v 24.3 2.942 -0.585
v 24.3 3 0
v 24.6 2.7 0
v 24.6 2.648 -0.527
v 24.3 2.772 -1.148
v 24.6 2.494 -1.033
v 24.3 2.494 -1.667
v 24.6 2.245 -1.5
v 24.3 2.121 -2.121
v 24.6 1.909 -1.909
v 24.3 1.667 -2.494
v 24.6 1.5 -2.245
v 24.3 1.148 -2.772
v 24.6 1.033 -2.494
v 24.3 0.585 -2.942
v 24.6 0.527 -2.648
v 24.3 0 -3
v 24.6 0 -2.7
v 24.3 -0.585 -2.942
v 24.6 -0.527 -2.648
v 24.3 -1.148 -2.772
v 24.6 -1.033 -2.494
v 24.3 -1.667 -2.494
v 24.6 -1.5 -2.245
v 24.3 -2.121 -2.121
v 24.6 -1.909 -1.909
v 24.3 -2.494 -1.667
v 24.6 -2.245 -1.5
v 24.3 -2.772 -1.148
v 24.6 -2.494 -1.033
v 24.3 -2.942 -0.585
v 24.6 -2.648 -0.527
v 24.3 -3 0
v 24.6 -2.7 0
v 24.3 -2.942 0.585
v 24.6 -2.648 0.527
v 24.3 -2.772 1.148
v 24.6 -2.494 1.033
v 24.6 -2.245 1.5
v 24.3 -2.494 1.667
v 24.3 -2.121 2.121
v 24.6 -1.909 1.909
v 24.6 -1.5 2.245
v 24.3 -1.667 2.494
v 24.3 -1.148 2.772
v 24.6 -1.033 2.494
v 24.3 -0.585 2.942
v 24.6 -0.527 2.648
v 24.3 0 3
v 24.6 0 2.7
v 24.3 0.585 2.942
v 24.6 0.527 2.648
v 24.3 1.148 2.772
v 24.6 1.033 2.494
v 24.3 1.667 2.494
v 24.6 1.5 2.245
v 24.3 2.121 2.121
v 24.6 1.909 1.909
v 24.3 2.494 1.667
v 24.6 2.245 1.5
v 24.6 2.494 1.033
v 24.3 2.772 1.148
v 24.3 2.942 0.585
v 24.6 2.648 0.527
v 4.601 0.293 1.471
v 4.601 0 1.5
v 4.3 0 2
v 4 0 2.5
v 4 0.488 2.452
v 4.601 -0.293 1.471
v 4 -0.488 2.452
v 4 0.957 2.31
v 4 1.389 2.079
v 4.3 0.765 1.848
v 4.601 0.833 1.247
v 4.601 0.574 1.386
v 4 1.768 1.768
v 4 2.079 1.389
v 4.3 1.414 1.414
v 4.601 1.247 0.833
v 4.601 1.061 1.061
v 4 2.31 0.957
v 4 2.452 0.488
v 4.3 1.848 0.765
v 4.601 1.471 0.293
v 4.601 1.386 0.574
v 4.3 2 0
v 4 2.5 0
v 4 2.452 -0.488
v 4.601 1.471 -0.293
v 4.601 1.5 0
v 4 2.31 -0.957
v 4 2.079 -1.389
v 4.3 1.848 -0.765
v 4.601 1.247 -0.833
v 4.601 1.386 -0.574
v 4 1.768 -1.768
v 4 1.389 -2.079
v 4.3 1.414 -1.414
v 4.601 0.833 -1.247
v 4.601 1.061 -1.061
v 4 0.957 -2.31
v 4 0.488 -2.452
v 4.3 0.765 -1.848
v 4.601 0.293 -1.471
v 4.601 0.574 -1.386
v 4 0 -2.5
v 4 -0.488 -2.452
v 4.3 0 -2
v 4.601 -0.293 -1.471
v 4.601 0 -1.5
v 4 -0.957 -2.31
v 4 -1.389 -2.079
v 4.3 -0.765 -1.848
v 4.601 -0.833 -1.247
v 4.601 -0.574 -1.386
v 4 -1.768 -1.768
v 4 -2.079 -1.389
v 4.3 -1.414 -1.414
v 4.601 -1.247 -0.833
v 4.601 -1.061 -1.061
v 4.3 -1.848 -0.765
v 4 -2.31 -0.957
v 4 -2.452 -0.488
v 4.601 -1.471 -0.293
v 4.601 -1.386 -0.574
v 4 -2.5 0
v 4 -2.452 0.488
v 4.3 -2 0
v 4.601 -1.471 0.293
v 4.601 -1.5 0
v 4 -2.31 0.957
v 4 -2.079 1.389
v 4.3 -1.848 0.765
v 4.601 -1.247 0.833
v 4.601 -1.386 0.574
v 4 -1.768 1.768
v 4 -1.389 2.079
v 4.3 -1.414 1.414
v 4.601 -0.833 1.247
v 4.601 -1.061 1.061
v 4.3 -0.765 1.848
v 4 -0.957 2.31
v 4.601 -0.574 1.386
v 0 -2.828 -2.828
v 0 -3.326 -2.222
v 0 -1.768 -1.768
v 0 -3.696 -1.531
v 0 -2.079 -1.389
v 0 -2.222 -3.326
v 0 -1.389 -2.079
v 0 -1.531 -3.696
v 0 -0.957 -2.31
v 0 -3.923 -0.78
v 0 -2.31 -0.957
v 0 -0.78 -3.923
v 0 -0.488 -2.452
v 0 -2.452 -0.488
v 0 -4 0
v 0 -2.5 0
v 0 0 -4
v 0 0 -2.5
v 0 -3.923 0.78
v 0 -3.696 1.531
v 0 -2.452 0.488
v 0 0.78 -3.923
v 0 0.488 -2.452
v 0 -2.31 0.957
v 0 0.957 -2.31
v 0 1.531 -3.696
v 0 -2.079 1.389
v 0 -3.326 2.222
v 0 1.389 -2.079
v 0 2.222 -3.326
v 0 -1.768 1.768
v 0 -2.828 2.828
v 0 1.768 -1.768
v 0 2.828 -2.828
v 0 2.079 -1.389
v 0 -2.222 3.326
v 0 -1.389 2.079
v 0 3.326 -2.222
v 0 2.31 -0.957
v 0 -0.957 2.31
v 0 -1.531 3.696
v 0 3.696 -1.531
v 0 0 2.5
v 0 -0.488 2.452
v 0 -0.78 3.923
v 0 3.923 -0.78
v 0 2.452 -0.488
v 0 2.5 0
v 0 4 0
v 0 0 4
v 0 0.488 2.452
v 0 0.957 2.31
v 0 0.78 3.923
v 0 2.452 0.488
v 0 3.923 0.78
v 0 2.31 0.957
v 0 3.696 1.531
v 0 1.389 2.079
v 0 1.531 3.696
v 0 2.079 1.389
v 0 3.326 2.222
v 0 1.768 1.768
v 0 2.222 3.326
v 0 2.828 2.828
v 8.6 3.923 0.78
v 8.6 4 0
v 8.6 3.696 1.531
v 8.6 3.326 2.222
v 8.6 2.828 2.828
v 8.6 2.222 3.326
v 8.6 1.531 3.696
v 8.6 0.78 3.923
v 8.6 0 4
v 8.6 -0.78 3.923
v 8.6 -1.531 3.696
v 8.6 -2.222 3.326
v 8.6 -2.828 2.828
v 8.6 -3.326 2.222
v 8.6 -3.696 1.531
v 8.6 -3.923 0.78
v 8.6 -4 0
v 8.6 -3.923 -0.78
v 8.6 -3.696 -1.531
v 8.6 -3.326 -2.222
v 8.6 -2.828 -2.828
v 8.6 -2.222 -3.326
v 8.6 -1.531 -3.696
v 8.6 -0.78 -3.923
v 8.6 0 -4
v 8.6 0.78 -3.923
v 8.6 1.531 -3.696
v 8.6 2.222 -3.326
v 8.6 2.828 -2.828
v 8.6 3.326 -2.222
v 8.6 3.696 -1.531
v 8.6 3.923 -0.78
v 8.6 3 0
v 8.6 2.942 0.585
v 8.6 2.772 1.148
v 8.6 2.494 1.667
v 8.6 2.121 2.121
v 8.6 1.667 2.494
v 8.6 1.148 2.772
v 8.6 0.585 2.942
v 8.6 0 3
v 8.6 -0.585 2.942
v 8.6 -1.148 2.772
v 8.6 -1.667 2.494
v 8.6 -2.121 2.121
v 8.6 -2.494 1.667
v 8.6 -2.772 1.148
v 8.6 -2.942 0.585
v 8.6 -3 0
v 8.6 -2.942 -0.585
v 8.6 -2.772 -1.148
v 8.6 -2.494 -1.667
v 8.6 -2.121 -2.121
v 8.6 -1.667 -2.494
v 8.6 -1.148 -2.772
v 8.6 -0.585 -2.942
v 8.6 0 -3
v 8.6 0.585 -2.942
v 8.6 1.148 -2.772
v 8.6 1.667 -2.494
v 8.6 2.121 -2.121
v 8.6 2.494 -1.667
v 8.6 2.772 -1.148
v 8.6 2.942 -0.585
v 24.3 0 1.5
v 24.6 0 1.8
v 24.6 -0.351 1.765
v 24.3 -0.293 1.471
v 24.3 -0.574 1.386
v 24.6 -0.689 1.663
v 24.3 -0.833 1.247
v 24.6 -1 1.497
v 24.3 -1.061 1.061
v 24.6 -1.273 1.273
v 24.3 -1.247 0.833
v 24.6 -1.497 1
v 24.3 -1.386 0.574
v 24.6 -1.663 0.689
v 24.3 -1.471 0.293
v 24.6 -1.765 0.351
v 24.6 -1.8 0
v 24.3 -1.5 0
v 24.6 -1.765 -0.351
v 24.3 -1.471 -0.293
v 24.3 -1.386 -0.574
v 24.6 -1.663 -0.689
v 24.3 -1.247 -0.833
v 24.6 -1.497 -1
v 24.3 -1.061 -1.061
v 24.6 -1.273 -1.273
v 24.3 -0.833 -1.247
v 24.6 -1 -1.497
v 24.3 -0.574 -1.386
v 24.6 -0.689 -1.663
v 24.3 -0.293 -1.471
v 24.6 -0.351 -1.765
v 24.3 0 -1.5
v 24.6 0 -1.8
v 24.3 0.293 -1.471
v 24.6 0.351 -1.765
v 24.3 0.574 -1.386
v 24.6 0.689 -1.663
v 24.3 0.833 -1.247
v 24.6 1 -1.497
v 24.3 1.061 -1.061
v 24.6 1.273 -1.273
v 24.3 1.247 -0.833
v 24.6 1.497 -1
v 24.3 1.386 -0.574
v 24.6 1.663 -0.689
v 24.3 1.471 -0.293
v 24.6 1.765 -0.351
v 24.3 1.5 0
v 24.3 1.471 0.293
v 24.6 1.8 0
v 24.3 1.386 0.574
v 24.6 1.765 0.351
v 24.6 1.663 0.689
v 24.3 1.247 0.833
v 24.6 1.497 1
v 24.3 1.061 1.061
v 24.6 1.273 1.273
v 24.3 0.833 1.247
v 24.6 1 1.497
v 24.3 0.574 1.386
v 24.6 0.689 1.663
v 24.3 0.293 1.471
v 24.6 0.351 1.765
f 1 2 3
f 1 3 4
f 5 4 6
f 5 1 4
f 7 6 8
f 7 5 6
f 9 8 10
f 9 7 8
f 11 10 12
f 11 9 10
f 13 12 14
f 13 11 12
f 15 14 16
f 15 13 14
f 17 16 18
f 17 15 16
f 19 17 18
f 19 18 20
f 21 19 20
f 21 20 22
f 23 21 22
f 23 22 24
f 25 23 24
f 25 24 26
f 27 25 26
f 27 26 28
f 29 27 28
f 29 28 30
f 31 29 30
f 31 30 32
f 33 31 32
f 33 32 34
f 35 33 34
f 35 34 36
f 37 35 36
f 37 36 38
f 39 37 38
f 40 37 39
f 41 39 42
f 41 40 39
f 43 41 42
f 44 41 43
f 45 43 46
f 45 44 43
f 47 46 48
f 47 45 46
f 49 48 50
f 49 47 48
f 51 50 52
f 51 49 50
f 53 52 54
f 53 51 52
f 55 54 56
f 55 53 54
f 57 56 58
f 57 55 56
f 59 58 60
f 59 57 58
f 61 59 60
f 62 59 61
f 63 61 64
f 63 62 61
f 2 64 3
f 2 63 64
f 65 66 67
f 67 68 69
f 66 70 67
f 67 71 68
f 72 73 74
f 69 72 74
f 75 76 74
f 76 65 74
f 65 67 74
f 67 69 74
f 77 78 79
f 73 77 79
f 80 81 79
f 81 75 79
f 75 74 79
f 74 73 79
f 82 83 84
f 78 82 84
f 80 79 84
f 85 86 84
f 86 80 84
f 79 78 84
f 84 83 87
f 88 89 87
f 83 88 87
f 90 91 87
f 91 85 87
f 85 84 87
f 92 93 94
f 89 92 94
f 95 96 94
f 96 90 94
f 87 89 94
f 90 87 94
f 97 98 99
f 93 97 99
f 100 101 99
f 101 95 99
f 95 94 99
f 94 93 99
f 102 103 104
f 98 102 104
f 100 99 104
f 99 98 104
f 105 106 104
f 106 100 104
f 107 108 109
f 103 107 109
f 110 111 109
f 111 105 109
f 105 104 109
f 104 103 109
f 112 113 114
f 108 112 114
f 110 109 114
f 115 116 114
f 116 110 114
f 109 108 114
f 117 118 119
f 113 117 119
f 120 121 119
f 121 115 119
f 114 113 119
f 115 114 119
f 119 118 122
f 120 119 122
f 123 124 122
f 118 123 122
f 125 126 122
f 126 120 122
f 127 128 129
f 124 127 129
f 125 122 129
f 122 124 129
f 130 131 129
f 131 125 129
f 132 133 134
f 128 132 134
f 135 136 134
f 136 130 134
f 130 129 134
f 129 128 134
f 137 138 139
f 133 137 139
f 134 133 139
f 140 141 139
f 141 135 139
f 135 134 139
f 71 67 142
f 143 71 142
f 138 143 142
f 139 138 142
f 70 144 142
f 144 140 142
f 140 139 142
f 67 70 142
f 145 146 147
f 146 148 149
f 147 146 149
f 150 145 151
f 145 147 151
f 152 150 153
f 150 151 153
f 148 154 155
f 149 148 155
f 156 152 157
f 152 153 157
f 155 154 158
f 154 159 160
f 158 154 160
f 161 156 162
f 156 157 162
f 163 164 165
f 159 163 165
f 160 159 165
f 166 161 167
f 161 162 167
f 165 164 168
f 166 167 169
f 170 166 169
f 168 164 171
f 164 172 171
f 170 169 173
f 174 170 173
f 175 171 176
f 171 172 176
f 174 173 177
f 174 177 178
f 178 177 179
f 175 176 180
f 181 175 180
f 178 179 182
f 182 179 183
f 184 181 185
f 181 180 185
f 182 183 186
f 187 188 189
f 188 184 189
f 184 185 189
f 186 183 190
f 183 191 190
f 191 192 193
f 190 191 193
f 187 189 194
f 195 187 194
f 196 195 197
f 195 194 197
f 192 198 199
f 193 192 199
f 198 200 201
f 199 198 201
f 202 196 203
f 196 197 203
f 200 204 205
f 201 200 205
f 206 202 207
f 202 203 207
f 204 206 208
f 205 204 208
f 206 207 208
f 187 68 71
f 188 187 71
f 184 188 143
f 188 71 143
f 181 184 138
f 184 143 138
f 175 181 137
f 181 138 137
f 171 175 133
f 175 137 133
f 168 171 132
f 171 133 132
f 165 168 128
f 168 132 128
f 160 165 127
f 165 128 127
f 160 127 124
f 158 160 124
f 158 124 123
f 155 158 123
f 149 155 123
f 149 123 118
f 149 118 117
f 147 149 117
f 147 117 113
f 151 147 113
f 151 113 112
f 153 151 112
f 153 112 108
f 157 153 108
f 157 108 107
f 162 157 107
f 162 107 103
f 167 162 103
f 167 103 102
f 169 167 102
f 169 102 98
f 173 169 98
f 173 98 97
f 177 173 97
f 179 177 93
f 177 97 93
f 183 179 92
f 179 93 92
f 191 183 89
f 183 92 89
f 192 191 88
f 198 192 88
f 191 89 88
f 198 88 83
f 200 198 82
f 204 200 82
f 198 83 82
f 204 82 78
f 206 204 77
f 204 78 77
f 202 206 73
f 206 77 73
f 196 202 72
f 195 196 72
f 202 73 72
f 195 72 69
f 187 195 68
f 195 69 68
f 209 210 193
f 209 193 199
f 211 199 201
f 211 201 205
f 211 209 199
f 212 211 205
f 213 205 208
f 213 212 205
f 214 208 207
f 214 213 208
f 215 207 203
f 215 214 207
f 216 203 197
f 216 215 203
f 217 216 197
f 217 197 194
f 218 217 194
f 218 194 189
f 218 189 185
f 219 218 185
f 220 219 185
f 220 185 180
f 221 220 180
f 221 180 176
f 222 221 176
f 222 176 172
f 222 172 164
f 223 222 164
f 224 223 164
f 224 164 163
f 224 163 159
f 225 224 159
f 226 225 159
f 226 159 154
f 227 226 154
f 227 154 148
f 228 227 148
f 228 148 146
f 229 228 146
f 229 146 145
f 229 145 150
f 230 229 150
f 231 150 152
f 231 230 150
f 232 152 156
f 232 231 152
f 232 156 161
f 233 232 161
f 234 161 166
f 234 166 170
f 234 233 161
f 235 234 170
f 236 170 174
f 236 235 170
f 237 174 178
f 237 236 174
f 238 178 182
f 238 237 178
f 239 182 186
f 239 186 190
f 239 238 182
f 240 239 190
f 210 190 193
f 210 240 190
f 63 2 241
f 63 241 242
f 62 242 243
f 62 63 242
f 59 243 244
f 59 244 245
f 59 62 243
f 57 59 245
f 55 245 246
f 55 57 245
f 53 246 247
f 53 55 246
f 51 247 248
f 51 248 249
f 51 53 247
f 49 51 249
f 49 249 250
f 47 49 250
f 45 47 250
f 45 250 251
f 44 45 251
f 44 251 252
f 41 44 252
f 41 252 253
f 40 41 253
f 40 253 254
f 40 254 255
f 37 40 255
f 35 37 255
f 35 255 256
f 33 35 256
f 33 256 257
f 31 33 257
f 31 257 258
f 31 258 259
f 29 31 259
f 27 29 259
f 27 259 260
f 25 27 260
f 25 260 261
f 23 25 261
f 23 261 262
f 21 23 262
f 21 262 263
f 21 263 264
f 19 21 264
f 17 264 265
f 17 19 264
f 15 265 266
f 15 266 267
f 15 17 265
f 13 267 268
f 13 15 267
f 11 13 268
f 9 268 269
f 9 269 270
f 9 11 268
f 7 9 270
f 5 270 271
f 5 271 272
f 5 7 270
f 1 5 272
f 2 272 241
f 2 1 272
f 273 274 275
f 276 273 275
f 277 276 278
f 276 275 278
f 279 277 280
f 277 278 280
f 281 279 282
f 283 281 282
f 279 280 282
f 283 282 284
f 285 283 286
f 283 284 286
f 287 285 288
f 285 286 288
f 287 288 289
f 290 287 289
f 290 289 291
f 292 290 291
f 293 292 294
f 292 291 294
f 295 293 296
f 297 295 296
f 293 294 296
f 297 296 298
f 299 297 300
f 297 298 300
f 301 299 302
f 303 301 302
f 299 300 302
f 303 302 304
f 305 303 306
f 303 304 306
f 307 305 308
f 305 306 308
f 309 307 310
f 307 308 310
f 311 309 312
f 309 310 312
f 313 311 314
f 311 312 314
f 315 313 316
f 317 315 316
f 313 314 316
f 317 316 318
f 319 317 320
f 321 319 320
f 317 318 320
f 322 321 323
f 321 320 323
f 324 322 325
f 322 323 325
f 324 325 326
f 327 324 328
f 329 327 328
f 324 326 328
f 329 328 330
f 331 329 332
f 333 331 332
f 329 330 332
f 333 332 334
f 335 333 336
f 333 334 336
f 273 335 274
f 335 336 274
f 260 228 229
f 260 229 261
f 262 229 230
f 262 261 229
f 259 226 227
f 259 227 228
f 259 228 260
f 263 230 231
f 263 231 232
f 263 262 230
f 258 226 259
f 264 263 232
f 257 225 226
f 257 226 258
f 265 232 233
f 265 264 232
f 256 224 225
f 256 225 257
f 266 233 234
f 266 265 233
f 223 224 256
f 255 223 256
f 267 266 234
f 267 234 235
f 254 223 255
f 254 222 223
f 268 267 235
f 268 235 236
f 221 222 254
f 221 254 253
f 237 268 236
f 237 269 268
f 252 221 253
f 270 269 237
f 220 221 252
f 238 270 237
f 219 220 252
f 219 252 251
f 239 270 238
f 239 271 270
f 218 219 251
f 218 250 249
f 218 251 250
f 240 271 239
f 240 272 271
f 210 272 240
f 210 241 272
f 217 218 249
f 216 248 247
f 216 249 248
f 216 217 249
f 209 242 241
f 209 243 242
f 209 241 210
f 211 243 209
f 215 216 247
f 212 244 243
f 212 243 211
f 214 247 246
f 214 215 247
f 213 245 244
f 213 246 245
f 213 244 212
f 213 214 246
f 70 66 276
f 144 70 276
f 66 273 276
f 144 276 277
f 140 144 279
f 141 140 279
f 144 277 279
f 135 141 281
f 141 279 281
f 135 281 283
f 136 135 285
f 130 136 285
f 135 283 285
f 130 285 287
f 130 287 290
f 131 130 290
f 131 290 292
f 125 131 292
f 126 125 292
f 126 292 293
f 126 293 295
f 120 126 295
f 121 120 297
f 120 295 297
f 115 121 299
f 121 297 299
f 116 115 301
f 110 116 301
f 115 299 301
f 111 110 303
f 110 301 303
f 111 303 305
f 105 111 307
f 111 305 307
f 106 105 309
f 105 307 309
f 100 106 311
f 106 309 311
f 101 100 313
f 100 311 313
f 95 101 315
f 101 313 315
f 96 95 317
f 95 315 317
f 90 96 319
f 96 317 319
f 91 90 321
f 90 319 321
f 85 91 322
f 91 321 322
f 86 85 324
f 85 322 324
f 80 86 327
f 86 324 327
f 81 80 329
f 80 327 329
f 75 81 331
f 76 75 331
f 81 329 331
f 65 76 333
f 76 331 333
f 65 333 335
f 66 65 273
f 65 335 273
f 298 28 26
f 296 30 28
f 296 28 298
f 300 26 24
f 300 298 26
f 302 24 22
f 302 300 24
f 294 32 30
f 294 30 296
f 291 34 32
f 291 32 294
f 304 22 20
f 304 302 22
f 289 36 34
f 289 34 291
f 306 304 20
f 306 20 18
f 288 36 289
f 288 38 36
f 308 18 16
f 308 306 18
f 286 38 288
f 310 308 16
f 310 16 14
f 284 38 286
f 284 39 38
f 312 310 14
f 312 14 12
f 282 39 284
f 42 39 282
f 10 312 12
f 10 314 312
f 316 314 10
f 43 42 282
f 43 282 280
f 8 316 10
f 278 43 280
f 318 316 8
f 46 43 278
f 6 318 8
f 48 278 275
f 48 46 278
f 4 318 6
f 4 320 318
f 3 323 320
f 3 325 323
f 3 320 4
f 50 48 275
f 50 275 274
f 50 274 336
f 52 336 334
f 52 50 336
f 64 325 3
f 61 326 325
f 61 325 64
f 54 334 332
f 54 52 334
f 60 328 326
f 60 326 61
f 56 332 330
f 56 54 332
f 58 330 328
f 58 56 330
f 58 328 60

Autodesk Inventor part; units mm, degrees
ref_plane "YZ Plane" through (0, 0, 0) normal (1, 0, 0) x (0, 1, 0)
ref_plane "XZ Plane" through (0, 0, 0) normal (0, 1, 0) x (-1, 0, 0)
ref_plane "XY Plane" through (0, 0, 0) normal (0, 0, 1) x (1, 0, 0)
sketch "Skizze1" plane through (0, 0, 0) normal (0, 0, 1) x (1, 0, 0)
  line L0 (0, 0) -> (24.6, 0)
  line L1 (0, 0) -> (0, 4)
  line L2 (0, 4) -> (8.6, 4)
  line L3 (8.6, 4) -> (8.6, 3)
  line L4 (8.6, 3) -> (24.6, 3)
  line L5 (24.6, 3) -> (24.6, 0)
  dimension "d0" = 8
  dimension "d1" = 6
  dimension "d2" = 8.6
  dimension "d3" = 16
revolve "Umdrehung1" add sketch "Skizze1" angle 360 about axis through (0, 0, 0) along (1, 0, 0)
sketch "Skizze2" plane through (0, 0, 0) normal (-1, 0, 0) x (0, 0, 1)
  point P0 (0, 0)
hole "Bohrung1" at (0, 0, 0) direction (1, 0, 0) diameter 3 end through all
hole "Bohrung2" at (0, 0, 0) direction (1, 0, 0) diameter 5 depth 4 tip angle 118
thread "Gewinde1" size "M6x1" class "6g" standard "ANSI Metric M Profile" length 8
chamfer "Fase1" distance 0.3 angle 45 2 edges at (24.6, -3, 0) (24.6, 0, -1.5)
properties part number "SlipRingExtender" material "Messing, weicher Gelbton"
